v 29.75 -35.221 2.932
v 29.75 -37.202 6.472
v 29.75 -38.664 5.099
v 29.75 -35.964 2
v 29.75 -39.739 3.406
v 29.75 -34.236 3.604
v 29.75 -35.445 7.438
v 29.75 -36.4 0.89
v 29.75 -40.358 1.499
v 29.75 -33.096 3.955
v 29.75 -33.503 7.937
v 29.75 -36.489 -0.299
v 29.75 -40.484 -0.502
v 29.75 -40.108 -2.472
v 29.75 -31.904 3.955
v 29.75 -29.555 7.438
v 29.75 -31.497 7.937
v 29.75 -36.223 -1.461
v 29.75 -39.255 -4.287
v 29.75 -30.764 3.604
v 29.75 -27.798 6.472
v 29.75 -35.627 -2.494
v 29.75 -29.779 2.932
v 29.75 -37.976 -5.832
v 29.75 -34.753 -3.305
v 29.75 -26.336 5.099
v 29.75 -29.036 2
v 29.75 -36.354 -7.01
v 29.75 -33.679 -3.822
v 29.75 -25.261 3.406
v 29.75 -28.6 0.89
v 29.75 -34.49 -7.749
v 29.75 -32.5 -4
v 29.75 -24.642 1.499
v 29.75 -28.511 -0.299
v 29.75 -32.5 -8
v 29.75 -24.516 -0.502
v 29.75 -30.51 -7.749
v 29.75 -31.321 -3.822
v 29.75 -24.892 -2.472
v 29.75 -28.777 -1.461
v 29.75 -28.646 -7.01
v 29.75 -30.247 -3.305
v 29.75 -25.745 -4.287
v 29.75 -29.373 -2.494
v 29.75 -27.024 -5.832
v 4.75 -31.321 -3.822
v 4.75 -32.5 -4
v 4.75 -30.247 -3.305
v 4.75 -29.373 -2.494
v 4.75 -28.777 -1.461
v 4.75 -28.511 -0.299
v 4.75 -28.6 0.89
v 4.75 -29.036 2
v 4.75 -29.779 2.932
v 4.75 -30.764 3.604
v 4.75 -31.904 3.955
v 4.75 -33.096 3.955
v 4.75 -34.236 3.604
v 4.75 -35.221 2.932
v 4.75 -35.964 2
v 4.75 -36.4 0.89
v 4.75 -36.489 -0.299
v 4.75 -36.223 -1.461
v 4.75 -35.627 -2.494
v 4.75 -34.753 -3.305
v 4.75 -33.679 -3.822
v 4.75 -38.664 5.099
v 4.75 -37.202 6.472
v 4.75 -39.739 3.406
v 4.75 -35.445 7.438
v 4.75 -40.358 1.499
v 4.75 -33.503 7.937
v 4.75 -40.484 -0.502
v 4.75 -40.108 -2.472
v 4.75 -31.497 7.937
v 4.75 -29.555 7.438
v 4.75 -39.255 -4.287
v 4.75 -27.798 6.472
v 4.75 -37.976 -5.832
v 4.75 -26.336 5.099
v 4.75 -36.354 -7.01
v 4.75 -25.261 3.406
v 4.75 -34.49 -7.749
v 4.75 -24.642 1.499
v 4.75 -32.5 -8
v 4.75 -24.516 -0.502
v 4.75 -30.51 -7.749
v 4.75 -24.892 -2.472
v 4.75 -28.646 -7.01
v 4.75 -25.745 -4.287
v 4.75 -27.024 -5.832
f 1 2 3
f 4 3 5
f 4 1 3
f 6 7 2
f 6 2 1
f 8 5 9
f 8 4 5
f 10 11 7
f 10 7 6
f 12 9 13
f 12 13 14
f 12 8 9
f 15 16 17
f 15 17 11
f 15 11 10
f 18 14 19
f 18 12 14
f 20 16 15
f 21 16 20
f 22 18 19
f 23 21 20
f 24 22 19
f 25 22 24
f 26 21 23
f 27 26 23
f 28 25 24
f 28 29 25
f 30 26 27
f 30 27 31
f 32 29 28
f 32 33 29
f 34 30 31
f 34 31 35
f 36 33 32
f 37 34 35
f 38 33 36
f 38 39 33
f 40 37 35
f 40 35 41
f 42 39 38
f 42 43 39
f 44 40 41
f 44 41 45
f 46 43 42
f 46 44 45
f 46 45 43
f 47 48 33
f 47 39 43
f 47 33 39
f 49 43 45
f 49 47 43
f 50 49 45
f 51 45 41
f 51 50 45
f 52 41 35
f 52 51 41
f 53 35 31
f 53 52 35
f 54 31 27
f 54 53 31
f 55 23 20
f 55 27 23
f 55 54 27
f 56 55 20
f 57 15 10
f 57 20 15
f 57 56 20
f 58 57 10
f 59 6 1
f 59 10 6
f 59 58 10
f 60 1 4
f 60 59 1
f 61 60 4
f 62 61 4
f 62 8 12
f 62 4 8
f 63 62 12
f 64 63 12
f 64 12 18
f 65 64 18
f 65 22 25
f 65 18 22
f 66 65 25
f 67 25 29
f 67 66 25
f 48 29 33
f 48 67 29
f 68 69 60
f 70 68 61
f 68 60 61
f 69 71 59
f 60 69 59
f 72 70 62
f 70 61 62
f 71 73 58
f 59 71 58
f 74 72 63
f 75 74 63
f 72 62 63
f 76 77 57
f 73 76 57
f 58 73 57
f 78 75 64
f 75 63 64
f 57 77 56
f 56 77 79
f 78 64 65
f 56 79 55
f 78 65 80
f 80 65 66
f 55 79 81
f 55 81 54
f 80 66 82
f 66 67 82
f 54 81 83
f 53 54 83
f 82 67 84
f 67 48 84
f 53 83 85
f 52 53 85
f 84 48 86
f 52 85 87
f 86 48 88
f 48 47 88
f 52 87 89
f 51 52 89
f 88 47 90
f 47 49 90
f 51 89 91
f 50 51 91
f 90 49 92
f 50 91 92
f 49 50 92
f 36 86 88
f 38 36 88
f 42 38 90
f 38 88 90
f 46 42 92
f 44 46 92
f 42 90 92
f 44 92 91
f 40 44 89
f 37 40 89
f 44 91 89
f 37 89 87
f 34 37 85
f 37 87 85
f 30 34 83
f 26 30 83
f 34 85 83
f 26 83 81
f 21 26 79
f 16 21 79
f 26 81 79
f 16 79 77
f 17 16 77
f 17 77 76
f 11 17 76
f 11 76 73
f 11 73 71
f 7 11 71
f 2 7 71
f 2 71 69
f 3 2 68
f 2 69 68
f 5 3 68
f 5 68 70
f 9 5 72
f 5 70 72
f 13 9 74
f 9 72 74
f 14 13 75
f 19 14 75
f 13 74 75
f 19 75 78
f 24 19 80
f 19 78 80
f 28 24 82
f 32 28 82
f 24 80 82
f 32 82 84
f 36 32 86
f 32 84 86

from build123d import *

# Parameters (mm, degrees)
LM8UU_CEN_X_Y_INT_R           = 4
LM8UU_CEN_X_Y_INT_DEPTH       = 27
LM8UU_CEN_X_Y_INT_PITCH_ANGLE = 90
LM8UU_CEN_X_Y_EXT_R           = 8
LM8UU_CEN_X_Y_EXT_DEPTH       = 25
LM8UU_CEN_X_Y_EXT_PITCH_ANGLE = 90


with BuildPart() as lm8uu_cen_x_y_int:
    # lm8uu_cen_x_y_int → lm8uu_cen_x_y_int (new body)
    with BuildSketch(Plane.XY):
        Circle(LM8UU_CEN_X_Y_INT_R)
    extrude(amount=LM8UU_CEN_X_Y_INT_DEPTH)


with BuildPart() as lm8uu_cen_x_y_int_1:
    # lm8uu_cen_x_y_int pitch: moved
    add(lm8uu_cen_x_y_int.part.rotate(Axis((0, 0, 0), (0, 1, 0)), LM8UU_CEN_X_Y_INT_PITCH_ANGLE))


with BuildPart() as lm8uu_cen_x_y_int_2:
    # lm8uu_cen_x_y_int placement: moved
    add(lm8uu_cen_x_y_int_1.part.moved(Location((-13.5, 0, 0))))


with BuildPart() as lm8uu_cen_x_ny:
    # lm8uu_cen_x_y_ext → lm8uu_cen_x_y_ext (new body)
    with BuildSketch(Plane.XY):
        Circle(LM8UU_CEN_X_Y_EXT_R)
    extrude(amount=LM8UU_CEN_X_Y_EXT_DEPTH)


with BuildPart() as lm8uu_cen_x_ny_1:
    # lm8uu_cen_x_y_ext pitch: moved
    add(lm8uu_cen_x_ny.part.rotate(Axis((0, 0, 0), (0, 1, 0)), LM8UU_CEN_X_Y_EXT_PITCH_ANGLE))


with BuildPart() as lm8uu_cen_x_ny_2:
    # lm8uu_cen_x_y_ext placement: moved
    add(lm8uu_cen_x_ny_1.part.moved(Location((-12.5, 0, 0))))

    # lm8uu_cen_x_y: cut lm8uu_cen_x_y_int
    add(lm8uu_cen_x_y_int_2.part, mode=Mode.SUBTRACT)


with BuildPart() as lm8uu_cen_x_ny_3:
    # lm8uu_cen_x_y placement: moved
    add(lm8uu_cen_x_ny_2.part.moved(Location((17.25, 32.5, 0))))


with BuildPart() as lm8uu_cen_x_ny_4:
    # Clone029 placement: moved
    add(lm8uu_cen_x_ny_3.part.moved(Location((0, -65, 0))))


solid = lm8uu_cen_x_ny_4.part
